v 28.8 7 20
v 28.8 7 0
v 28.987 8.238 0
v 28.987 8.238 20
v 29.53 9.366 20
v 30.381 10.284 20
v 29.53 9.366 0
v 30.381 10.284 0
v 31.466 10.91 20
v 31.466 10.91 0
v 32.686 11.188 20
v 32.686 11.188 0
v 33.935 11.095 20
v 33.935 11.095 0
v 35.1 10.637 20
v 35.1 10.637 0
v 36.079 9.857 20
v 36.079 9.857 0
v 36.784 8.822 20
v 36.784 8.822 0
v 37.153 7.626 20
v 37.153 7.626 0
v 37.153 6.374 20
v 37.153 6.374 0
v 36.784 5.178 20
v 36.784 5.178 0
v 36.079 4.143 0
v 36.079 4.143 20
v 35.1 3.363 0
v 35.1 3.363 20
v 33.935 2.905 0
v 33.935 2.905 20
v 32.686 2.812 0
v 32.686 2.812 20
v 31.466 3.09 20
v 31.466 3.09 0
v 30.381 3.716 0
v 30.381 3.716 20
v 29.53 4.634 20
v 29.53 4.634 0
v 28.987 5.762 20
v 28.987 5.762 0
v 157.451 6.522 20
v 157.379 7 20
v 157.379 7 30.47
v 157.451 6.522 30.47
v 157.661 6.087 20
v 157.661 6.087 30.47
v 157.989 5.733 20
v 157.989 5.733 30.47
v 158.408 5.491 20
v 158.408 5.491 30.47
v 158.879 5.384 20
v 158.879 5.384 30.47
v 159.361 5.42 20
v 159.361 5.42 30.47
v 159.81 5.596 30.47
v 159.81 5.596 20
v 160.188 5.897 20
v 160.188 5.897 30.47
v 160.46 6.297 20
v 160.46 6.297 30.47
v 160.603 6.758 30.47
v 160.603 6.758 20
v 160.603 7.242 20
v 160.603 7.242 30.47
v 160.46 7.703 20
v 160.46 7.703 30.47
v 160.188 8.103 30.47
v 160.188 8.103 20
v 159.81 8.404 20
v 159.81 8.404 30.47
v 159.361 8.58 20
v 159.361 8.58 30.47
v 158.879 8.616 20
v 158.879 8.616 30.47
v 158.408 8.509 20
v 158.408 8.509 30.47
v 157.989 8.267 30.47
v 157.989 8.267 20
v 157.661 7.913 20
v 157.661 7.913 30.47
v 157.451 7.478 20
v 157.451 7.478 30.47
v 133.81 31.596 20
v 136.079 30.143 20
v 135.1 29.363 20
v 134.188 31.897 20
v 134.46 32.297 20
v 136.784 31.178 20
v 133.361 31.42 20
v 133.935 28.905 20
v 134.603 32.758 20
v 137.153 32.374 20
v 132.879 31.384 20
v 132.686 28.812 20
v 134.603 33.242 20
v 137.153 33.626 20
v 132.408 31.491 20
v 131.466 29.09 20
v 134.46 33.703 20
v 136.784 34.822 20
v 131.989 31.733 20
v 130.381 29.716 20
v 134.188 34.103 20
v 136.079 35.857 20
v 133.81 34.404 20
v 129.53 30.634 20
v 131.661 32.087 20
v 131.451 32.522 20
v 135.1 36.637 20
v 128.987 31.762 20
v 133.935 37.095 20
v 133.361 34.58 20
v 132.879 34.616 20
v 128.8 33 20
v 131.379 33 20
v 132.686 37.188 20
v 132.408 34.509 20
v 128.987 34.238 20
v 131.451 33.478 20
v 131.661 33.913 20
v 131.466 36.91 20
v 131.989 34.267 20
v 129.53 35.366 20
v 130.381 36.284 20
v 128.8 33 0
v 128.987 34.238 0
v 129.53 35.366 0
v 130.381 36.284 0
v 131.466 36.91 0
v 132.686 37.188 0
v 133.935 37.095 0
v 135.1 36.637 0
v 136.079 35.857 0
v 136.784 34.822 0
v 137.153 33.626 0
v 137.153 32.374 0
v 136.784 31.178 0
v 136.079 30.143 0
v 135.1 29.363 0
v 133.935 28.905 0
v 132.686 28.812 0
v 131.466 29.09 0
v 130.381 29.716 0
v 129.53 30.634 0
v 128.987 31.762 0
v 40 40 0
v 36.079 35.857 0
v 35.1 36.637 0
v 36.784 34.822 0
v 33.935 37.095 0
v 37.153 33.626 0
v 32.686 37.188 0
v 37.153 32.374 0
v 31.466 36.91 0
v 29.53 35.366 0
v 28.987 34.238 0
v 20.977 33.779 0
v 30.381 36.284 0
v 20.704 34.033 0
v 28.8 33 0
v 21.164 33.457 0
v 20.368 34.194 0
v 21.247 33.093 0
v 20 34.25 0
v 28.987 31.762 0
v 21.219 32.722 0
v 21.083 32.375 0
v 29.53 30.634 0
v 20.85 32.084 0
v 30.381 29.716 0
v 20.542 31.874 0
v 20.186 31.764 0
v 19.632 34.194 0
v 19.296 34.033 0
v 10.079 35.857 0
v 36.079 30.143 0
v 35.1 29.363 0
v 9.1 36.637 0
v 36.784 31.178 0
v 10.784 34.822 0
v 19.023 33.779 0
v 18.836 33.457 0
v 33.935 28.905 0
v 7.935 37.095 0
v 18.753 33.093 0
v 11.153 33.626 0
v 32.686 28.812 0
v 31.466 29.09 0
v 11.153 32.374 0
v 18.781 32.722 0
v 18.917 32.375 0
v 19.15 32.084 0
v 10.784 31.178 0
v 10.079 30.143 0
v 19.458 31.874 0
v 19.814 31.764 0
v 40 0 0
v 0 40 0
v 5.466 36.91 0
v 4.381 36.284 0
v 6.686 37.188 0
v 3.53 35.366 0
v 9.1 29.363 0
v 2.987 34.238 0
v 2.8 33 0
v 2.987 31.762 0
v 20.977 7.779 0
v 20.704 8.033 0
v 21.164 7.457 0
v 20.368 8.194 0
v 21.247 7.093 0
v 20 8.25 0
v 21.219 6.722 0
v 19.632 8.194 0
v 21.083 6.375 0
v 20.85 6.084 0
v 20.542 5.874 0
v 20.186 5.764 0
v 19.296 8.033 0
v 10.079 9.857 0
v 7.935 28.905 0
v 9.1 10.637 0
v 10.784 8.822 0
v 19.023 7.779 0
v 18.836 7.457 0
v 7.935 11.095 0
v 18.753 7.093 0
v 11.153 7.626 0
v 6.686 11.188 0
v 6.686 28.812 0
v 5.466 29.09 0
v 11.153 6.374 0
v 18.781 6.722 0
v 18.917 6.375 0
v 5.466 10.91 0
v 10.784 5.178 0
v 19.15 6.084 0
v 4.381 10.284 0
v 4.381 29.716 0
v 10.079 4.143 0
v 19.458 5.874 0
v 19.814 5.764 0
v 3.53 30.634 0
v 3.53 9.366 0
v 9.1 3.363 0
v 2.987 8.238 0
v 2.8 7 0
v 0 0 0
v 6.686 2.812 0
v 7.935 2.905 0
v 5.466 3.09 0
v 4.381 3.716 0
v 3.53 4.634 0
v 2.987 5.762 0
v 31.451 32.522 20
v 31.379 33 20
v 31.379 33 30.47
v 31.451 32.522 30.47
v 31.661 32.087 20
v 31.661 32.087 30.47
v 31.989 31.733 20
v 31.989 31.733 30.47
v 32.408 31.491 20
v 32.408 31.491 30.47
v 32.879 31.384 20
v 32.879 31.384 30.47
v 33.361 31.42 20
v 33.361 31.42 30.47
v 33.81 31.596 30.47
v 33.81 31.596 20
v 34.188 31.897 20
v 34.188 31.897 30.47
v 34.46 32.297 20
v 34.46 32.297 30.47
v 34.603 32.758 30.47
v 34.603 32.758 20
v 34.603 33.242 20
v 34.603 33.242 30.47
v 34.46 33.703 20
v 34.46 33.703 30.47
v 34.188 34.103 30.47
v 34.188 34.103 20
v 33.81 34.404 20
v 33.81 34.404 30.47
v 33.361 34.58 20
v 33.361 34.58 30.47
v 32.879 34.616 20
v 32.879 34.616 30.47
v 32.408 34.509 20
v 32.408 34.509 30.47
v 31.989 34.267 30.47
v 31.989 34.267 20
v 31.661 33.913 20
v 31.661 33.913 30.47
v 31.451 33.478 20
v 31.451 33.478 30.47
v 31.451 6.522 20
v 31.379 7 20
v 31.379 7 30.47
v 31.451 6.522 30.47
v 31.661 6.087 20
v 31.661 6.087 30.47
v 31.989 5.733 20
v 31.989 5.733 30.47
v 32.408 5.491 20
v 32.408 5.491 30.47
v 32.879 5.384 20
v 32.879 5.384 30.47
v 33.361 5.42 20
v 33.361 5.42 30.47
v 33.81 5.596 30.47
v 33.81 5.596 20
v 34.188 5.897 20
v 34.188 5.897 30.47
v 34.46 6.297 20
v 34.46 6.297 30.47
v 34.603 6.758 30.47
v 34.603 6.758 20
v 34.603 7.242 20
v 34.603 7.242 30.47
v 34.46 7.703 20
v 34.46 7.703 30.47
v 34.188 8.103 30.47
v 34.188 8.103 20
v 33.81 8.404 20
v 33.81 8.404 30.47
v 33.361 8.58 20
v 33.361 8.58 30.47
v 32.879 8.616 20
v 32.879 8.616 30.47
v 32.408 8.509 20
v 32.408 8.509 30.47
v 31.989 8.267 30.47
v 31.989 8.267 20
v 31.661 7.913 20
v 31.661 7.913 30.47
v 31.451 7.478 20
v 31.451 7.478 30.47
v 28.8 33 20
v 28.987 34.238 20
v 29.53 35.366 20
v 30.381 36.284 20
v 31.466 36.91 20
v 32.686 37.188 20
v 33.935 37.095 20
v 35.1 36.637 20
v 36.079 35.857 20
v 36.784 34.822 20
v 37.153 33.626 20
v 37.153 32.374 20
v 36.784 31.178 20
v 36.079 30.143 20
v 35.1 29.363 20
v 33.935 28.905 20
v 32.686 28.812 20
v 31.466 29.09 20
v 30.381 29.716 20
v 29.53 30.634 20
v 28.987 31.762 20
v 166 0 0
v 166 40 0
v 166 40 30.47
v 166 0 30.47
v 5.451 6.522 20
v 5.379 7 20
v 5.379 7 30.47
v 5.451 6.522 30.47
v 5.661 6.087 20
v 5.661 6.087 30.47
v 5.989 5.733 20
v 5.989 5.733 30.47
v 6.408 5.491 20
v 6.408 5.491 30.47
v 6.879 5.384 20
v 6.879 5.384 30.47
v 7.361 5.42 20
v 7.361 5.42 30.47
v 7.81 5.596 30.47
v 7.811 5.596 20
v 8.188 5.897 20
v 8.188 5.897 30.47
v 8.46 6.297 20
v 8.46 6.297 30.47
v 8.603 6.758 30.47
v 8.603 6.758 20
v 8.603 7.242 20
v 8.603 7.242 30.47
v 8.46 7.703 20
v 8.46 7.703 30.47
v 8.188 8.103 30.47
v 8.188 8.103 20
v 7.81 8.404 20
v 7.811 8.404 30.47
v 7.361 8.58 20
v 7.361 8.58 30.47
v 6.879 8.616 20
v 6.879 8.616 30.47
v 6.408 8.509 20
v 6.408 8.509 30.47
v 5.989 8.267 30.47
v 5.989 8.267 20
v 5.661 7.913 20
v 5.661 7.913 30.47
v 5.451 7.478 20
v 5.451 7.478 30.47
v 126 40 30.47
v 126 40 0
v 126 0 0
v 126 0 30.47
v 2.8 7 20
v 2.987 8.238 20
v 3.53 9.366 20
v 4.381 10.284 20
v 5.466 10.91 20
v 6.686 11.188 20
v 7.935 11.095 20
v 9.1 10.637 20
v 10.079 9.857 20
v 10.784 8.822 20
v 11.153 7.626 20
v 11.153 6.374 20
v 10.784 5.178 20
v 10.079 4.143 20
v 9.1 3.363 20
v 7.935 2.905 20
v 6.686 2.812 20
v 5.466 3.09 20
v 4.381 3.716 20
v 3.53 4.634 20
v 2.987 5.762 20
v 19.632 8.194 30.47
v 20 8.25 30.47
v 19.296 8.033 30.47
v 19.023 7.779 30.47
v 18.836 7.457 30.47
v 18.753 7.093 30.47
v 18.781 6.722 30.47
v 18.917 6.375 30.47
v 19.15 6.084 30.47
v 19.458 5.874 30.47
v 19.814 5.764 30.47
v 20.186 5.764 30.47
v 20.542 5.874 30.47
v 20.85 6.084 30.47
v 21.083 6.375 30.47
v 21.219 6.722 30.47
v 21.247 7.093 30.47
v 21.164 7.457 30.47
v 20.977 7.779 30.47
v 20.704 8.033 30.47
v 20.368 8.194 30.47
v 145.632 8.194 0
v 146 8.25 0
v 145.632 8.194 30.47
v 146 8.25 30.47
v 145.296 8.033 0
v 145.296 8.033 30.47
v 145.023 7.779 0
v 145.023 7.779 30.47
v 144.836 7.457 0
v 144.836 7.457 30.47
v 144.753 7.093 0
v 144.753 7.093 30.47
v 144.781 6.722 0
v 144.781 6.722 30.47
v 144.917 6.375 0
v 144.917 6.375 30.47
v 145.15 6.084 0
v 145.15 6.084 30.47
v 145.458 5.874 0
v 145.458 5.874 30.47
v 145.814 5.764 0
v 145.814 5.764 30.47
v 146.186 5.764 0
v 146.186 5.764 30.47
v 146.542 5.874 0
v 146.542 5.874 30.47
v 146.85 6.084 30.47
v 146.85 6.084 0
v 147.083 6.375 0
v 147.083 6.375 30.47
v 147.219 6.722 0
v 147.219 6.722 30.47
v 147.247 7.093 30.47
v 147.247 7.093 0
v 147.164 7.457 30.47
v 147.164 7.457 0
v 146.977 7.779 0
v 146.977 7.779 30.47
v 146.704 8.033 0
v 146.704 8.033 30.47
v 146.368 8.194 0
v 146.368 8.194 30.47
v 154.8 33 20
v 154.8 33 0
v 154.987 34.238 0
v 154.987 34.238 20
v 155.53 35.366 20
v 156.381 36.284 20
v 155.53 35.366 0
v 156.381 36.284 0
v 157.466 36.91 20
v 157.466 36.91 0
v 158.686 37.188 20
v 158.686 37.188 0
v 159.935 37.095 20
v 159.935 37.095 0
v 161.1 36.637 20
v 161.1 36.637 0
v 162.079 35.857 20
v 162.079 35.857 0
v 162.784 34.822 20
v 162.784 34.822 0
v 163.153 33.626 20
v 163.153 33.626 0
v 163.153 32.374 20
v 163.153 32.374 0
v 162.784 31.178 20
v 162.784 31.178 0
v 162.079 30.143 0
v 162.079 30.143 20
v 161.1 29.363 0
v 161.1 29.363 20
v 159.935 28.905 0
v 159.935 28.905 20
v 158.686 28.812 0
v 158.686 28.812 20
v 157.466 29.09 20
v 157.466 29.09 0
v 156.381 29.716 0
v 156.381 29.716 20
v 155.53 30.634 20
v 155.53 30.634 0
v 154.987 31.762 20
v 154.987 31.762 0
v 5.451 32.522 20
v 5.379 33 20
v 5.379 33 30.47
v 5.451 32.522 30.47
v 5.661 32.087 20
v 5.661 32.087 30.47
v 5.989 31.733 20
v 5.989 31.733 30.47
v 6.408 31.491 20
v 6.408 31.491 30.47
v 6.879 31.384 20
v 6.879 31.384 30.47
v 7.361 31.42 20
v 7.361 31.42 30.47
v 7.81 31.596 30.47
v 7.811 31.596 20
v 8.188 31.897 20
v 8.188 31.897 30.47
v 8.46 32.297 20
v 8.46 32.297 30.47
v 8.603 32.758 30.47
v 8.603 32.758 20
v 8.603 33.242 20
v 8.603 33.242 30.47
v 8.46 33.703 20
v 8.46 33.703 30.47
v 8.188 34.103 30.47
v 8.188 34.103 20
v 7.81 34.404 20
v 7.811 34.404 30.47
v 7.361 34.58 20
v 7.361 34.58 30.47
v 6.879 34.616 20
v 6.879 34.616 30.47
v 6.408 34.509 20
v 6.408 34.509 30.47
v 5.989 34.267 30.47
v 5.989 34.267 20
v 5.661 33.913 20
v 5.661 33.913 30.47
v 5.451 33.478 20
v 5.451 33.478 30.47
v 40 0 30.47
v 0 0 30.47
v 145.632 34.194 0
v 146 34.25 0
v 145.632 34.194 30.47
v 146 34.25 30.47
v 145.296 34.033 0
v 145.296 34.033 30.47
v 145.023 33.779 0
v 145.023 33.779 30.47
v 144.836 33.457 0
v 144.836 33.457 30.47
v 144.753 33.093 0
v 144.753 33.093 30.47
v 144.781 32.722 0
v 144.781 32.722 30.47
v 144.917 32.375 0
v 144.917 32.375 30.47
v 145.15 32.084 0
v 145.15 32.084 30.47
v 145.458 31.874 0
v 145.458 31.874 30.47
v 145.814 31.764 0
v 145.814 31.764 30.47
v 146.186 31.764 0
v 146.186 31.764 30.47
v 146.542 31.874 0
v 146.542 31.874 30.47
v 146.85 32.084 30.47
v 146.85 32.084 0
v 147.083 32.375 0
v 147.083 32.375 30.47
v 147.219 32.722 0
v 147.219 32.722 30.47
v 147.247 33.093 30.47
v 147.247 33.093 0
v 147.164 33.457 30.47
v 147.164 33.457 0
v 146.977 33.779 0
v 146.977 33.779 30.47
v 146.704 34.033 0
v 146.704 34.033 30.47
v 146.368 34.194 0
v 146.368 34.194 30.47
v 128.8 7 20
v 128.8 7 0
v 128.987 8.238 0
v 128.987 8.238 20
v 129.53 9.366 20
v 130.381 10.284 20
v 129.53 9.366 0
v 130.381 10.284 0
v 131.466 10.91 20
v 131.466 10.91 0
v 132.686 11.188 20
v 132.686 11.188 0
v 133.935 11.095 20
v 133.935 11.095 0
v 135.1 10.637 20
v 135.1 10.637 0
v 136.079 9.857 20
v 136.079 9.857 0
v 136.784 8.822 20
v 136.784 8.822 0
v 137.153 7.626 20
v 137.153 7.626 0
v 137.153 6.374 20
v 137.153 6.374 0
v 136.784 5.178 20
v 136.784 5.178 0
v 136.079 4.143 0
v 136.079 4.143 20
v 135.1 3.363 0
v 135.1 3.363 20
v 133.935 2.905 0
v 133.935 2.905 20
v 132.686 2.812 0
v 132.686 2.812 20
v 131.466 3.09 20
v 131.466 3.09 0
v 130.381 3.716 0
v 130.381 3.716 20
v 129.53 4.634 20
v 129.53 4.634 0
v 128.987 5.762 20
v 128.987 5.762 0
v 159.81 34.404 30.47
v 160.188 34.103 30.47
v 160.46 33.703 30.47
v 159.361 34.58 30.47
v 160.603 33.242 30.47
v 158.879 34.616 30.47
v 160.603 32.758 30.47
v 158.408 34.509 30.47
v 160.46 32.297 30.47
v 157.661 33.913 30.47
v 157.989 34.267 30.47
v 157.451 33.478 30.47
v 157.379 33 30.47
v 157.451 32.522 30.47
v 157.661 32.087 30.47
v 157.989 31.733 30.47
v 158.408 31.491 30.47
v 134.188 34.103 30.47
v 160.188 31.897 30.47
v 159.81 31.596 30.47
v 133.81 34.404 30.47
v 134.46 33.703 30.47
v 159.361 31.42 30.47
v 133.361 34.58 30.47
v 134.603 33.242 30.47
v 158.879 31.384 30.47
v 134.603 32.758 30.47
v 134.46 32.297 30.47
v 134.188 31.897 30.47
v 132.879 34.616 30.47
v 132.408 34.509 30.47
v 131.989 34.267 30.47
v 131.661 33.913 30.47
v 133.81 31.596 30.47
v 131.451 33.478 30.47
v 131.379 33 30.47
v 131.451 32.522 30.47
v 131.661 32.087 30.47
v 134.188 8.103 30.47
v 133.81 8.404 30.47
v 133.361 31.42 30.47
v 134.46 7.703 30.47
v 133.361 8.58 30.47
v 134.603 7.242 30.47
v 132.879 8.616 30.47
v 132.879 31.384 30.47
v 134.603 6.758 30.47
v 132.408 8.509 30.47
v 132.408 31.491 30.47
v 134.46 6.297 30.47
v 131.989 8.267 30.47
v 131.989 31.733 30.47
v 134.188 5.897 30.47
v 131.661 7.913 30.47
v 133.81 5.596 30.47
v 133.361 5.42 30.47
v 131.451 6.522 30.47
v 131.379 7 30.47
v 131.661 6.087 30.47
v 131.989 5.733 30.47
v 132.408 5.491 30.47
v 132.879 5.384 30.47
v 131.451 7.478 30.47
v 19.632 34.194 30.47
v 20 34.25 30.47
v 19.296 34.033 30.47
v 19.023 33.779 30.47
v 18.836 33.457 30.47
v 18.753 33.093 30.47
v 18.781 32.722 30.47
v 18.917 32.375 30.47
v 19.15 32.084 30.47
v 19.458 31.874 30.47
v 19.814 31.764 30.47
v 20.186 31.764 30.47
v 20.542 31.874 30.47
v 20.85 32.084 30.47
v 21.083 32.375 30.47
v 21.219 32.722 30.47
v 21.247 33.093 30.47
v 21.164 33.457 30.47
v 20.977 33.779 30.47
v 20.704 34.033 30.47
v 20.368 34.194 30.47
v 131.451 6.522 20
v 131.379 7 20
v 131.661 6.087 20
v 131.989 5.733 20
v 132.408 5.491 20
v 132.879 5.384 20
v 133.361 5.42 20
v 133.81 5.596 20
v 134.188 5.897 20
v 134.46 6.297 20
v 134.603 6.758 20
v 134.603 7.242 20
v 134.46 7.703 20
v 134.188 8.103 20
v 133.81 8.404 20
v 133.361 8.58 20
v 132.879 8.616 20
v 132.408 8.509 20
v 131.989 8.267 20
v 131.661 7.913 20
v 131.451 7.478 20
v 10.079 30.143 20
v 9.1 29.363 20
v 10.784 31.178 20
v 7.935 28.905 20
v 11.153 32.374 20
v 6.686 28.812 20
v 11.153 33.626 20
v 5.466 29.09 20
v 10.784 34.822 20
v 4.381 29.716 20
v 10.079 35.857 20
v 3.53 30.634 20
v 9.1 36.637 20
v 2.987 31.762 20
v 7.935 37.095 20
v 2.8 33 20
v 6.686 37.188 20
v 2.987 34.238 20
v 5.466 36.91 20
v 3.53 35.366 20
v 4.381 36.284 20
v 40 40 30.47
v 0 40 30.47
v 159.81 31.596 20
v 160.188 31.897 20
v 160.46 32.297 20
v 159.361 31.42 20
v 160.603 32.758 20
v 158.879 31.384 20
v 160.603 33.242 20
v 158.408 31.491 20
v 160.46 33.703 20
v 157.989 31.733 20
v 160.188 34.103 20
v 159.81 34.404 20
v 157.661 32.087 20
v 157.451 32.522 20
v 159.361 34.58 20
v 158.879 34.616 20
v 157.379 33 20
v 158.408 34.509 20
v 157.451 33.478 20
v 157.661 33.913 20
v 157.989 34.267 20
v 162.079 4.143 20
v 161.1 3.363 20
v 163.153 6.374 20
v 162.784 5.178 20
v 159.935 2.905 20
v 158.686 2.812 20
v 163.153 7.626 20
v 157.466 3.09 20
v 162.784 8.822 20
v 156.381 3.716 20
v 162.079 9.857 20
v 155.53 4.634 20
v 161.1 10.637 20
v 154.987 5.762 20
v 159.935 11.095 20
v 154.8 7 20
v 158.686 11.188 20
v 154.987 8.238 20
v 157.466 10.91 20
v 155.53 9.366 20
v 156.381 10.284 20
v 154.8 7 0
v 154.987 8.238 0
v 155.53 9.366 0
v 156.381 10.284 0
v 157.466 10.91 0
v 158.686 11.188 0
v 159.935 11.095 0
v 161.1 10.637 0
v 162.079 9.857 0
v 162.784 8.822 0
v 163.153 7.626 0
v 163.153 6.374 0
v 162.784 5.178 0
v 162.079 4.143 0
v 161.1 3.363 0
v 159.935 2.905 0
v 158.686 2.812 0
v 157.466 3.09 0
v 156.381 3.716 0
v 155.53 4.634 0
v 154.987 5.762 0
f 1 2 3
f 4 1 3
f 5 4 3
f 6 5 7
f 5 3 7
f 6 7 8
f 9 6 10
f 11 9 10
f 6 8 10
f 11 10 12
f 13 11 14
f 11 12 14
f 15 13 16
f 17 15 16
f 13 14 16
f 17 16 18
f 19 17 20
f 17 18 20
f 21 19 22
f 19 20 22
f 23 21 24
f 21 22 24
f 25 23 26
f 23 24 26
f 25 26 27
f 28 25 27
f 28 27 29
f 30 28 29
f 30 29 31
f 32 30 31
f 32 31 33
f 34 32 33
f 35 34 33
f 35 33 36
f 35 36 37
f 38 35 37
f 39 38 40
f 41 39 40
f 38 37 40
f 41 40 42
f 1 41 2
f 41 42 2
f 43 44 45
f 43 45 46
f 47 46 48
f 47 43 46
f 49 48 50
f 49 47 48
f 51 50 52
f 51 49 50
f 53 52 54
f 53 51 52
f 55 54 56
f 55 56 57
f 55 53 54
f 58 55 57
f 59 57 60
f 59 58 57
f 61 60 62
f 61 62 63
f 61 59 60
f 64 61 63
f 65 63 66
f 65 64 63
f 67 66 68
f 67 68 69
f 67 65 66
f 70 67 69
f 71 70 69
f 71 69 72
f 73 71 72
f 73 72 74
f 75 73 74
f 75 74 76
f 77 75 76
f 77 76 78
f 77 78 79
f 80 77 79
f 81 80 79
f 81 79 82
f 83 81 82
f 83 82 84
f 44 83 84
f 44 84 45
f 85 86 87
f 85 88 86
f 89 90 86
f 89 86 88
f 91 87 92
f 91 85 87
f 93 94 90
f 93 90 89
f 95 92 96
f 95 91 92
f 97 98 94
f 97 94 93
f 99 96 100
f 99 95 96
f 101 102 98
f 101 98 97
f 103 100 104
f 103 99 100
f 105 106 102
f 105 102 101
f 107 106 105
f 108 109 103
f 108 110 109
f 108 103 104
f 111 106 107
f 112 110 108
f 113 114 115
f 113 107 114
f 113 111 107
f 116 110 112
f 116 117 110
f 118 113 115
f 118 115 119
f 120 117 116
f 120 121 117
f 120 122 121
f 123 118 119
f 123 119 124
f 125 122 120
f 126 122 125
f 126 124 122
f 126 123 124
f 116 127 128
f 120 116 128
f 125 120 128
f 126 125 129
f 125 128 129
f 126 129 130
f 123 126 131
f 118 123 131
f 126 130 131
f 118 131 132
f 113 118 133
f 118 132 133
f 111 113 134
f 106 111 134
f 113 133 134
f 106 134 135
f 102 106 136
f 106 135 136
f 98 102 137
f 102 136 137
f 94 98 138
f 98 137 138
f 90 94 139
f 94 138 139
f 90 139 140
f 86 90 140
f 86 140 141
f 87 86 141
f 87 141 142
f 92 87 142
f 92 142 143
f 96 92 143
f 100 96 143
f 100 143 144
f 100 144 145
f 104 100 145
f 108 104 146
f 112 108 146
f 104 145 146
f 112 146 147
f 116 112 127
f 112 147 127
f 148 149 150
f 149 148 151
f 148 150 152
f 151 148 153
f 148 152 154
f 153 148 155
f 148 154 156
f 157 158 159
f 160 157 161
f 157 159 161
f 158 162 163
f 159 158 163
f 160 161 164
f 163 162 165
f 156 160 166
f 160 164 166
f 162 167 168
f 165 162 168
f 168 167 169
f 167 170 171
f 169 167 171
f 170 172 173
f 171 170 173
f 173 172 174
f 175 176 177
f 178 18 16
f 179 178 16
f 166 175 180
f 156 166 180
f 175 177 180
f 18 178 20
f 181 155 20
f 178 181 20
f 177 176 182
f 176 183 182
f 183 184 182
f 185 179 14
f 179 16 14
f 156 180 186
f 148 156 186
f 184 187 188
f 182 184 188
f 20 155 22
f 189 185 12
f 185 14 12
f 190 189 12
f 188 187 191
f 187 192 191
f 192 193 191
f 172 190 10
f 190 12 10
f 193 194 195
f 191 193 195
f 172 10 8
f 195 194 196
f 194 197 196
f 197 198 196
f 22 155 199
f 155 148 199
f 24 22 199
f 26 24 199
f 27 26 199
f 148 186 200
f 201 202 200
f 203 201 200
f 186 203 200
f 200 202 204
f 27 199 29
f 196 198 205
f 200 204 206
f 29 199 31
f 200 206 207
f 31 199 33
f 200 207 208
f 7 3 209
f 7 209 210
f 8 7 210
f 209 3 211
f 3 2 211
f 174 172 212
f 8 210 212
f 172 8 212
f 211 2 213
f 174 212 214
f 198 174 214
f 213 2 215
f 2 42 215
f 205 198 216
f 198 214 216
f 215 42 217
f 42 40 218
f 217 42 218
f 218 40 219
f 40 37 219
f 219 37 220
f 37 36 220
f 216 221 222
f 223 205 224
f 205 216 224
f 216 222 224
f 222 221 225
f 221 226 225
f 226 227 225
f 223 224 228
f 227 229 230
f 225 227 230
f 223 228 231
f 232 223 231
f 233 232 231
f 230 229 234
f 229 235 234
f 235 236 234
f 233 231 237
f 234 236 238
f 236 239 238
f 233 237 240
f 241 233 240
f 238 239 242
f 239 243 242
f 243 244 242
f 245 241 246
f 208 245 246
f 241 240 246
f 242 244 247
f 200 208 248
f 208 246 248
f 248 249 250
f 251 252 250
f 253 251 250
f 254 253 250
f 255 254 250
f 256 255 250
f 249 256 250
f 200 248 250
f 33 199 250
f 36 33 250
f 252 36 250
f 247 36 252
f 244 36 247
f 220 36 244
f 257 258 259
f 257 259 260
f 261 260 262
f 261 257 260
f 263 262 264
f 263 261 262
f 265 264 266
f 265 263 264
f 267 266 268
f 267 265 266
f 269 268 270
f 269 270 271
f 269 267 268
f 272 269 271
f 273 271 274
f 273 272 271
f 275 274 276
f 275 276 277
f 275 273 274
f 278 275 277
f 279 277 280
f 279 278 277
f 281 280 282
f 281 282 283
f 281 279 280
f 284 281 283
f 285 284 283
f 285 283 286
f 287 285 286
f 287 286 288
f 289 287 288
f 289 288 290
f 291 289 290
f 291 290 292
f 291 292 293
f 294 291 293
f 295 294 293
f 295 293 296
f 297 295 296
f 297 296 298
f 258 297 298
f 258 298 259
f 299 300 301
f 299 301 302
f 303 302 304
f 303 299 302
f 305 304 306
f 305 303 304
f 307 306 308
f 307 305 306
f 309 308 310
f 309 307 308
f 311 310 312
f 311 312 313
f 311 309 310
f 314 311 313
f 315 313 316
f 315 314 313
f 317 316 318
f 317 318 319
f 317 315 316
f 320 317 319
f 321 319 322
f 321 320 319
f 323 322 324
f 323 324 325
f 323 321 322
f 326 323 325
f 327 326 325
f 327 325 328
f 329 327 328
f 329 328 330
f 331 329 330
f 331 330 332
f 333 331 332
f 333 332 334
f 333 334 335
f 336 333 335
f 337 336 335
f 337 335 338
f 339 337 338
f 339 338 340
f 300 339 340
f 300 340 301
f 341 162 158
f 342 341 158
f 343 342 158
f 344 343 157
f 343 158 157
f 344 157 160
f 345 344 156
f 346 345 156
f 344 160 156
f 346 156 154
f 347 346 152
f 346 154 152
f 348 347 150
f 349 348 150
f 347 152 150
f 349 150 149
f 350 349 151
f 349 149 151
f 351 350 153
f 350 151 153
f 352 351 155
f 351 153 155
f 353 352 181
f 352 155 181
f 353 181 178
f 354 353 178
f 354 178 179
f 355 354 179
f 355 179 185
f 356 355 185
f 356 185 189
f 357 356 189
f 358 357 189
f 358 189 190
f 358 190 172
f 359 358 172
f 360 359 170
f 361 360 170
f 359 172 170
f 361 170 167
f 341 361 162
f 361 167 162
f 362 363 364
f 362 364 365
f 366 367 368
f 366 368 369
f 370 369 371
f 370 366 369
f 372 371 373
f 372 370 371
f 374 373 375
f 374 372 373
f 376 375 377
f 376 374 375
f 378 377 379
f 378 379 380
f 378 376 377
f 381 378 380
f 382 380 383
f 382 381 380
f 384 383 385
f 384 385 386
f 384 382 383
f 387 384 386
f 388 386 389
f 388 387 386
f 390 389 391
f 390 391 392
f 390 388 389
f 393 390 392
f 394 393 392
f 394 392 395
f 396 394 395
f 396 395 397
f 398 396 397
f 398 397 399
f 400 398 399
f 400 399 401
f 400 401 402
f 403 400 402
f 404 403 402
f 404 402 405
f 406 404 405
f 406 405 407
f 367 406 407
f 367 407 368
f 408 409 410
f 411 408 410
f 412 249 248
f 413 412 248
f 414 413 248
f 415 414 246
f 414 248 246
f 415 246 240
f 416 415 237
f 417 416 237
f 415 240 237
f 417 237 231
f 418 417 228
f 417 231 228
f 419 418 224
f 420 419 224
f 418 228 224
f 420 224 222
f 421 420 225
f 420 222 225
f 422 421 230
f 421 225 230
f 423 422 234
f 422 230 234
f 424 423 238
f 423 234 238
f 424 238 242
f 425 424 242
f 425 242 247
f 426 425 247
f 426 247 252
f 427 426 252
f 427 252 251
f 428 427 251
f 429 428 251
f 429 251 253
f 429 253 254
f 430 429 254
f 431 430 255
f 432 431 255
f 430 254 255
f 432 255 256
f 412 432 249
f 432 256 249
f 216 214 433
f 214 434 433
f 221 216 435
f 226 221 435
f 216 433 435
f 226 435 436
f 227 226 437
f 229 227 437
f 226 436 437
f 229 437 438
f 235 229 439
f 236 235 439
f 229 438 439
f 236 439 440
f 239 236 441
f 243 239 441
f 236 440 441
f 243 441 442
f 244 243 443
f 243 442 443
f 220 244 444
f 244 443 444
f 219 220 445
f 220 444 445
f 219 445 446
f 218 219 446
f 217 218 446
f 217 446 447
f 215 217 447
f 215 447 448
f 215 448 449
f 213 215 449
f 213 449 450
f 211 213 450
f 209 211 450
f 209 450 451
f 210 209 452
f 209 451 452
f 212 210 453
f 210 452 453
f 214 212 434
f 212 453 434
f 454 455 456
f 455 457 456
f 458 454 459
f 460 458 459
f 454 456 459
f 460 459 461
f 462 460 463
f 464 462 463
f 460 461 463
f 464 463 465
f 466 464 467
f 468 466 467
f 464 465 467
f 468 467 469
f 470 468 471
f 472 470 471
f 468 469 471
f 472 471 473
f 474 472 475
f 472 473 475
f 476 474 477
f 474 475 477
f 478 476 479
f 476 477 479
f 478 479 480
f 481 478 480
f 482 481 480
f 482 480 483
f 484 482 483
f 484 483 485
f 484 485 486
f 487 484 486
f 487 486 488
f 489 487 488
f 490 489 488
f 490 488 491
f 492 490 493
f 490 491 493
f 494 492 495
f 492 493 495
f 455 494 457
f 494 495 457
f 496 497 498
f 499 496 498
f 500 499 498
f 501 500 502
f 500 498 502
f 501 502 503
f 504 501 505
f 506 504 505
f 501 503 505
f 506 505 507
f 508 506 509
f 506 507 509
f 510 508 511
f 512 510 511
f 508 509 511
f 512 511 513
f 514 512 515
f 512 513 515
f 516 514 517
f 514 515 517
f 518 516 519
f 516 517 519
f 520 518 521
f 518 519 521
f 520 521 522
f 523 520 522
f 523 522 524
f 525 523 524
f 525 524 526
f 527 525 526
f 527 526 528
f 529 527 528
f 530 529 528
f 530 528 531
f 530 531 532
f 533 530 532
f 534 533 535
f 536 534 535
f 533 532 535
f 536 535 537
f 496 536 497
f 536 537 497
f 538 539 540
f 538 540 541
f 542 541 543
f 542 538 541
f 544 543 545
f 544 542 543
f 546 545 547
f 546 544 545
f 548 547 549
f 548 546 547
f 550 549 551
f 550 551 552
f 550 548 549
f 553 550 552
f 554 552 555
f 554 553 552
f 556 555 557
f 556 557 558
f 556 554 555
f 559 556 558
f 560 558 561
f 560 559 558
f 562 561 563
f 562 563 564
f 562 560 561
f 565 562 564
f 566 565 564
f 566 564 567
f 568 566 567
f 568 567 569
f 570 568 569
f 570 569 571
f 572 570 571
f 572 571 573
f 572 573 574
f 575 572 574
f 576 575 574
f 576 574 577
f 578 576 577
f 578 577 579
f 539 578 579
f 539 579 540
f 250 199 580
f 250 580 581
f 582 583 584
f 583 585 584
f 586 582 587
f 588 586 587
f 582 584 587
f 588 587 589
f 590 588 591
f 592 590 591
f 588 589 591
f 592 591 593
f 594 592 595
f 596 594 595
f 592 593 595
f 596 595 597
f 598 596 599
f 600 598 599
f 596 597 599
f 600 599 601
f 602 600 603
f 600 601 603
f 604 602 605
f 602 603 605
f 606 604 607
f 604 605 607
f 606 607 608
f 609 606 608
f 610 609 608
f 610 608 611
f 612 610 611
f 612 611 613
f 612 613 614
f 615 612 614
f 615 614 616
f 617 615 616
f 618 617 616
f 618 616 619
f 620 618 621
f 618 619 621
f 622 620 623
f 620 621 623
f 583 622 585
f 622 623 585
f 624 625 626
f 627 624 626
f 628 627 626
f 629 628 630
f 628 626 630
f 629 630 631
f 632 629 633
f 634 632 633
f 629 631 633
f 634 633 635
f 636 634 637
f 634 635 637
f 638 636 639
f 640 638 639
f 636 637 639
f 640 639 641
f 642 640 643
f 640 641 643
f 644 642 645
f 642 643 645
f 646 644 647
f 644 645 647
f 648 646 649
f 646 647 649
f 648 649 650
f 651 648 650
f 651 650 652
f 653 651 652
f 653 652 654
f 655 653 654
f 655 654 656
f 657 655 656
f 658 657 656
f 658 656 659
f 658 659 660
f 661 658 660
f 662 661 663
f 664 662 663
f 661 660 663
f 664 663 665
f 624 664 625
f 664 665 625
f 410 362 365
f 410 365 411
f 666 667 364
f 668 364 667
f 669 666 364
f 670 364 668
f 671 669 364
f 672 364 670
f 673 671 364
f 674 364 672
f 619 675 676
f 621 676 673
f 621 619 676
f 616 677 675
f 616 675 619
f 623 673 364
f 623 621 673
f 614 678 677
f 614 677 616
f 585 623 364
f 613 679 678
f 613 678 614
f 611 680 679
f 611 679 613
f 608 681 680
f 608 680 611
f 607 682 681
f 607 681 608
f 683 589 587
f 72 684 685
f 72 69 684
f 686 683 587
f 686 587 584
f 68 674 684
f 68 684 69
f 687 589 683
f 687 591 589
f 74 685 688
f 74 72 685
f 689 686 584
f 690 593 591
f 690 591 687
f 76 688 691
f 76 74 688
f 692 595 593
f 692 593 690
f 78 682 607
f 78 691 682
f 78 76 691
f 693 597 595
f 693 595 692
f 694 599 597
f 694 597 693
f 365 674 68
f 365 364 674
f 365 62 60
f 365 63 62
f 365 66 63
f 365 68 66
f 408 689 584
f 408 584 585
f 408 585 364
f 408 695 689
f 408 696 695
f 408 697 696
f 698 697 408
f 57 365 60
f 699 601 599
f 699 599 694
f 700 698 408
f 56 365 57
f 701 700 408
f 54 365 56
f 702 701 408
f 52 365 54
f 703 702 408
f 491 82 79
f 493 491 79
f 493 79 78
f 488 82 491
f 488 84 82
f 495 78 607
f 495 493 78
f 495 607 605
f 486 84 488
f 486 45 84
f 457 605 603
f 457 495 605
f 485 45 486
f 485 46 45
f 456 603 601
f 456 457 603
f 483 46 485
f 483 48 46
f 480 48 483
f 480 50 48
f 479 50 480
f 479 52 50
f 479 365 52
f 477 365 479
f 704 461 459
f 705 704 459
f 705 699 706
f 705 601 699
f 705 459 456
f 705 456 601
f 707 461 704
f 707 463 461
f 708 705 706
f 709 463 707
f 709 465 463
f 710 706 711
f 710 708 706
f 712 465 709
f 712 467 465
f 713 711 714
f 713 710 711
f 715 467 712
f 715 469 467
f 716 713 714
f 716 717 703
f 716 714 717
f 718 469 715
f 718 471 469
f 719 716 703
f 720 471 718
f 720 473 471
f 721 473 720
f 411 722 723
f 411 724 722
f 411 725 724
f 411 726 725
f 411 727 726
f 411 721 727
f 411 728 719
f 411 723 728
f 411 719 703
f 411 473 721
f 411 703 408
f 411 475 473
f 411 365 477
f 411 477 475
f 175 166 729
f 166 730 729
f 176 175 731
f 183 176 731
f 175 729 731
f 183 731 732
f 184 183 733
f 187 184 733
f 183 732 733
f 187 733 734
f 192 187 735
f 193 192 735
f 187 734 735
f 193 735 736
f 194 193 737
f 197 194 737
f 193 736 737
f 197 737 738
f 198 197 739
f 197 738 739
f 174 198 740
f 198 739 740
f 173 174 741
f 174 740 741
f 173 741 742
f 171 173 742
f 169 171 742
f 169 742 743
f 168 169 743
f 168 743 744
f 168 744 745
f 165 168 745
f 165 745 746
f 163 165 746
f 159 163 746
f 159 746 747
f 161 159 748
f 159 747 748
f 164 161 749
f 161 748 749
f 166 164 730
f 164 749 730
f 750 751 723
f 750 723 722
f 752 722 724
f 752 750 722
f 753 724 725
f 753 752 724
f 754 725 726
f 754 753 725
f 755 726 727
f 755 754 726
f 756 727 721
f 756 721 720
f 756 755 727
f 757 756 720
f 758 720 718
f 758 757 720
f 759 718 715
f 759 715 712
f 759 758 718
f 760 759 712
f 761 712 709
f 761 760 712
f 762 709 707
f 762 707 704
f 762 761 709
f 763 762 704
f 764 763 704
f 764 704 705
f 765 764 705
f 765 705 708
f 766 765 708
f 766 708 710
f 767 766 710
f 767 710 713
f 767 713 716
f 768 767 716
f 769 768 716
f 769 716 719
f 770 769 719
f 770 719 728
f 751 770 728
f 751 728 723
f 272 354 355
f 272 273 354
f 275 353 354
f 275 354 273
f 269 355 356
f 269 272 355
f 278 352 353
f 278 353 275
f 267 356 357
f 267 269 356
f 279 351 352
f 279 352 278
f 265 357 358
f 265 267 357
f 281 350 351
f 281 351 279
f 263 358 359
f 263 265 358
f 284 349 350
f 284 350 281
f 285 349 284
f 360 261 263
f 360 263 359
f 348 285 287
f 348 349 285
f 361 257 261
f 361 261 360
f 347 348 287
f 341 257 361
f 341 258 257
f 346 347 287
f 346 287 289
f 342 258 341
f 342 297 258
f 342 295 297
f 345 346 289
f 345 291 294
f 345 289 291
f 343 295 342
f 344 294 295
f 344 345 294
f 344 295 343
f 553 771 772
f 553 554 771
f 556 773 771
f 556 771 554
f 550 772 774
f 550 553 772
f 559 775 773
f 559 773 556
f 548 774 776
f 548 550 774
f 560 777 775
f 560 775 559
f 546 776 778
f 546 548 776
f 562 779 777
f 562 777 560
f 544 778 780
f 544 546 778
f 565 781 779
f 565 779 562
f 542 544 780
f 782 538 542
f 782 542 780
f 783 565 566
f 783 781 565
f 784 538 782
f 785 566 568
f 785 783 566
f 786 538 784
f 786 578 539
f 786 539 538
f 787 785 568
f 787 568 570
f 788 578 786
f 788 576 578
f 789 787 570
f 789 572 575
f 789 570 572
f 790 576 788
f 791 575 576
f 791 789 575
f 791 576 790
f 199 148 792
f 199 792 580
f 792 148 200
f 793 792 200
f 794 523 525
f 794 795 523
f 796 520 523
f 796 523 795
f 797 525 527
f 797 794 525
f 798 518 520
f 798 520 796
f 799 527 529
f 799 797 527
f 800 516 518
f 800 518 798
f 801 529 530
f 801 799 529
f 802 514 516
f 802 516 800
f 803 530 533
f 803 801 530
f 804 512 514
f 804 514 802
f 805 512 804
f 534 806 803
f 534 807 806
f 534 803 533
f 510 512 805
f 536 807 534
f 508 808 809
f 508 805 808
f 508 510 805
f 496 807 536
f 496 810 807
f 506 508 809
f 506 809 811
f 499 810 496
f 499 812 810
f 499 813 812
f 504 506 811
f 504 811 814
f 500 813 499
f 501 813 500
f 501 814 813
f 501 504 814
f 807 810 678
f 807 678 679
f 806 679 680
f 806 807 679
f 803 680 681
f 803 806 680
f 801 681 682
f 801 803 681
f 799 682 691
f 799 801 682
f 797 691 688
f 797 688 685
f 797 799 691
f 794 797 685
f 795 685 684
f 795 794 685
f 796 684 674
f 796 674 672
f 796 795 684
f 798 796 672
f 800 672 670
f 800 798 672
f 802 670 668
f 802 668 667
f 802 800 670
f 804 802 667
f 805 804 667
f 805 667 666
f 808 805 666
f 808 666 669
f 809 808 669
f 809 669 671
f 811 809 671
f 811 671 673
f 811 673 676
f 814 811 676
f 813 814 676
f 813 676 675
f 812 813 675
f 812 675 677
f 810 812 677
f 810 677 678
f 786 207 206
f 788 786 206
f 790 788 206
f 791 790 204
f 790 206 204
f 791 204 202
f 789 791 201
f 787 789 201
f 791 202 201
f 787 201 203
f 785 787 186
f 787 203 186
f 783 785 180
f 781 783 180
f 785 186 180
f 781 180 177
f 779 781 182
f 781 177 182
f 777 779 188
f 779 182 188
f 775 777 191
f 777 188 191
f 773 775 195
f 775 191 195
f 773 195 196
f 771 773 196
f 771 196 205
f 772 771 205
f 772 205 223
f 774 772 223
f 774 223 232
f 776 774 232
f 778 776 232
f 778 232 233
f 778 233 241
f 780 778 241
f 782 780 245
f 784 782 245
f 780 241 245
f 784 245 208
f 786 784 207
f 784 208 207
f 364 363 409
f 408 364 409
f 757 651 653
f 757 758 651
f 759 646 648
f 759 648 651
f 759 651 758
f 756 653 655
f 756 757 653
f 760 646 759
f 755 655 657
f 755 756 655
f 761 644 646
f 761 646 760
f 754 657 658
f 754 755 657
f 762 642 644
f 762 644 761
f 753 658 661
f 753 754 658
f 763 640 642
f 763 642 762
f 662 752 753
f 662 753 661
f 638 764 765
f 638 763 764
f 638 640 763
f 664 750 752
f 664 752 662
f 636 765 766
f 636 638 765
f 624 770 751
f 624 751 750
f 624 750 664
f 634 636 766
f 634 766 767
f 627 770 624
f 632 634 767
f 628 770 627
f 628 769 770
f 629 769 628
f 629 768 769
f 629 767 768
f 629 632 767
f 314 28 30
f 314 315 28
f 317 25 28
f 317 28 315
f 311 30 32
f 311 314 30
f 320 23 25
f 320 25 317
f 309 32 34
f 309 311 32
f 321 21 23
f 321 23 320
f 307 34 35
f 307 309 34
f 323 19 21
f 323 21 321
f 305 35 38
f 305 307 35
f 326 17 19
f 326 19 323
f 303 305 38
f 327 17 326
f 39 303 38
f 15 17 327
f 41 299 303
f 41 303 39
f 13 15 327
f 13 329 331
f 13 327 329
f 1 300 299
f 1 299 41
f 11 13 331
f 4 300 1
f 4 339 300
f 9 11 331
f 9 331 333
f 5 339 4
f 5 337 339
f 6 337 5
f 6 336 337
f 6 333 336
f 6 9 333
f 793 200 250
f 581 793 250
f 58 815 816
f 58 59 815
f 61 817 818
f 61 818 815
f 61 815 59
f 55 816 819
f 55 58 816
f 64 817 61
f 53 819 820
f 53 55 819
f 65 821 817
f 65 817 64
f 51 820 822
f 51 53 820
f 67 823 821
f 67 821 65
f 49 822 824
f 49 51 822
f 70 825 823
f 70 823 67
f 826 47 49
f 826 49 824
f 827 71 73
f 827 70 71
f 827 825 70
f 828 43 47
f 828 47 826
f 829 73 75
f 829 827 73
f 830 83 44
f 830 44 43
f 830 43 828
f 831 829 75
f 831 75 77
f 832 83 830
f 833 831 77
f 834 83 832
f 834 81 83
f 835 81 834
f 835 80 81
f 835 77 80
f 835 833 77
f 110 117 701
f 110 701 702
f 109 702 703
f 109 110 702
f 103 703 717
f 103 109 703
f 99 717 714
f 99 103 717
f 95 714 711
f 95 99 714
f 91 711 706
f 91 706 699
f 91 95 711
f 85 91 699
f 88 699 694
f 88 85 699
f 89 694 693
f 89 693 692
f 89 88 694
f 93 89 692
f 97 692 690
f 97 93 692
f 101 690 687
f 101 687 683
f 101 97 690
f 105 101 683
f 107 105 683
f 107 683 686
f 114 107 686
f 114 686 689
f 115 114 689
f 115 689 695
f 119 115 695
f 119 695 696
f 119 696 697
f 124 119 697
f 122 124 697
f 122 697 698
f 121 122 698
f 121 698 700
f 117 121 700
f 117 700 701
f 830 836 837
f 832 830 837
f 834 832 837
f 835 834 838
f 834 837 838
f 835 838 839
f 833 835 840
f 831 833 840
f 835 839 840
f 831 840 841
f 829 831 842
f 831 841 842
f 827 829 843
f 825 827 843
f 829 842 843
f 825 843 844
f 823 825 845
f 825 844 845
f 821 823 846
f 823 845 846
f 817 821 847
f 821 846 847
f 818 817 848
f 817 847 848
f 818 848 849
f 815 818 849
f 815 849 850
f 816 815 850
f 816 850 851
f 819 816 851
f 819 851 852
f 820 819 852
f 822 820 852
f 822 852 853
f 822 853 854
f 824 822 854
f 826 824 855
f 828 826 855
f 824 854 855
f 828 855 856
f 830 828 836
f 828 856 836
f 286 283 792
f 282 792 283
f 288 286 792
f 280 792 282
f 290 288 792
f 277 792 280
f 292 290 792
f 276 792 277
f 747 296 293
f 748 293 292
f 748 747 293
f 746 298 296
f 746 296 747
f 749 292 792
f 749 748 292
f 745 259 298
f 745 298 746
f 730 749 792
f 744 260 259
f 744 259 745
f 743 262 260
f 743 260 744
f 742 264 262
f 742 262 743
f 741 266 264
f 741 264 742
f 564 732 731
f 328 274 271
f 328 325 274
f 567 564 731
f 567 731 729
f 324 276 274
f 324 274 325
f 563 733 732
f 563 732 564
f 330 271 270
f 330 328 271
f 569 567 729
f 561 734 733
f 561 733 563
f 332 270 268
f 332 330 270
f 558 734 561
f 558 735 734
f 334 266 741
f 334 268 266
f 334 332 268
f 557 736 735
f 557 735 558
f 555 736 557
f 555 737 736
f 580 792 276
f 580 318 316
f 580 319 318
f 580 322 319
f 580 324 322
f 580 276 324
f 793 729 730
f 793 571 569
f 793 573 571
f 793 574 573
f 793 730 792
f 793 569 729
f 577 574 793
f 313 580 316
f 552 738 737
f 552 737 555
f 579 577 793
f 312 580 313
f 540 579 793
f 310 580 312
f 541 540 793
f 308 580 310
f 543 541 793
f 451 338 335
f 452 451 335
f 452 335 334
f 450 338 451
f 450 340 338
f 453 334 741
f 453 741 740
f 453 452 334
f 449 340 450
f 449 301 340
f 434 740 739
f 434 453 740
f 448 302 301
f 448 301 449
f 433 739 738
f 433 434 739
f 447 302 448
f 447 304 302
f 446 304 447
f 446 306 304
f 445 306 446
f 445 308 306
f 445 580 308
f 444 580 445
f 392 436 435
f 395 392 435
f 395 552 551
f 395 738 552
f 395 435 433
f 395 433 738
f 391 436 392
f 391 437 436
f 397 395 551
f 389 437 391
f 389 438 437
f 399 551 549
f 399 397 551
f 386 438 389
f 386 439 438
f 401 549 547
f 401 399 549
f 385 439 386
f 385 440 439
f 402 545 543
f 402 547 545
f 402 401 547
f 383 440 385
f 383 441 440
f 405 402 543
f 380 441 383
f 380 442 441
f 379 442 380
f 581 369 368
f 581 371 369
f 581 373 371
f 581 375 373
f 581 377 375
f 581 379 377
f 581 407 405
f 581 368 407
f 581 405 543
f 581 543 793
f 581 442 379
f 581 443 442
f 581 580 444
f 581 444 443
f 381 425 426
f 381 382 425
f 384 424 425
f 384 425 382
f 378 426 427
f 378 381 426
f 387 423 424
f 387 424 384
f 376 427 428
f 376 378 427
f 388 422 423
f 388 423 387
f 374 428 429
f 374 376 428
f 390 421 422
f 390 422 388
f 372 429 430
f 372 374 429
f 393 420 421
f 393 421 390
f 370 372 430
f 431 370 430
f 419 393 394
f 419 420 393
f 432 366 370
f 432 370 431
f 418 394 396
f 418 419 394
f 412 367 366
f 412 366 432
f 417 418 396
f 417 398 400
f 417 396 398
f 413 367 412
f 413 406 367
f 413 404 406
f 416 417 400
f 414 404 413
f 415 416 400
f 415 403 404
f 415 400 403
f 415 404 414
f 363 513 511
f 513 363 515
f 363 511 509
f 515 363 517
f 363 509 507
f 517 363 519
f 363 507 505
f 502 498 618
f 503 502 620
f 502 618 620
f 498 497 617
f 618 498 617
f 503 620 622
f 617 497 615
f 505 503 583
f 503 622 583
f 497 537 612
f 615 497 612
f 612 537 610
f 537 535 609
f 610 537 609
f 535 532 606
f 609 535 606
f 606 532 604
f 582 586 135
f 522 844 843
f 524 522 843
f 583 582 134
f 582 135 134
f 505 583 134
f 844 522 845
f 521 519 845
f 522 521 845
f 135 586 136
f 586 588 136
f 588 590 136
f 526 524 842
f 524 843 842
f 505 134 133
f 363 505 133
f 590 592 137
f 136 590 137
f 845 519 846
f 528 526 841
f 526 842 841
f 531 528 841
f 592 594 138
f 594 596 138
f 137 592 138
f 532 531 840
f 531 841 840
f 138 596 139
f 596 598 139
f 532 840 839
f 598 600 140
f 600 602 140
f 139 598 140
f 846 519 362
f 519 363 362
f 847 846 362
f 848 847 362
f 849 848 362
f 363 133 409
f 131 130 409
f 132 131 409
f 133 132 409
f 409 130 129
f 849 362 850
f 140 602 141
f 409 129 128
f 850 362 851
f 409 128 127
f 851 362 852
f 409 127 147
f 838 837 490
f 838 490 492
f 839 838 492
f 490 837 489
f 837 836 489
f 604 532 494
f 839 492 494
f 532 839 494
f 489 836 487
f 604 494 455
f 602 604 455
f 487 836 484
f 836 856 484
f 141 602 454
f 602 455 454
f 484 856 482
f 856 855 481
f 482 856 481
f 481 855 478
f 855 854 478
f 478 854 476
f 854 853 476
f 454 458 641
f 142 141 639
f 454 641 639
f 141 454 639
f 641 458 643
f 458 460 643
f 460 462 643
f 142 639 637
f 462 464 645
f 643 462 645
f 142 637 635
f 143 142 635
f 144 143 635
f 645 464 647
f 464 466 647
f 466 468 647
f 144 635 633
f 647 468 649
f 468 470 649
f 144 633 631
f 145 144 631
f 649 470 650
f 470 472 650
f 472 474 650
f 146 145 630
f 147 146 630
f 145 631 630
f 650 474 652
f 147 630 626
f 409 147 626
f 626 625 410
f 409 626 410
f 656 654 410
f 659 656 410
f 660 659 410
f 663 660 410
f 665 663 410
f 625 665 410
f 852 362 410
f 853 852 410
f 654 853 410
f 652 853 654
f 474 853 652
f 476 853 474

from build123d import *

# Parameters (mm, degrees)
SKETCH1_W                      = 40
SKETCH1_H                      = 40
SKETCH1_R                      = 1.621
BOSS_EXTRUDE1_DEPTH            = 30.47
BOSS_EXTRUDE1_2_DEPTH          = 30.47
SKETCH4_R                      = 4.2
CUT_EXTRUDE1_DEPTH             = 20
SKETCH7_W                      = 1.25
SKETCH7_H                      = 30.47
M3X0_5_TAPPED_HOLE1_AT_2_COUNT = 2
M3X0_5_TAPPED_HOLE1_AT_2_PITCH = 26
M3X0_5_TAPPED_HOLE1_AT_3_COUNT = 2
M3X0_5_TAPPED_HOLE1_AT_3_PITCH = 128.654576289
M3X0_5_TAPPED_HOLE1_AT_4_COUNT = 2
M3X0_5_TAPPED_HOLE1_AT_4_PITCH = 126


with BuildPart() as part:
    # Sketch1 → Boss-Extrude1 (new body)
    with BuildSketch(Plane(origin=(0, 0, 0), x_dir=(-1, 0, 0), z_dir=(0, 0, 1))):
        with Locations((-20, -20)):
            Rectangle(SKETCH1_W, SKETCH1_H)
        with Locations((-33, -7)):
            Circle(SKETCH1_R, mode=Mode.SUBTRACT)
        with Locations((-7, -7)):
            Circle(SKETCH1_R, mode=Mode.SUBTRACT)
        with Locations((-7, -33)):
            Circle(SKETCH1_R, mode=Mode.SUBTRACT)
        with Locations((-33, -33)):
            Circle(SKETCH1_R, mode=Mode.SUBTRACT)
    extrude(amount=BOSS_EXTRUDE1_DEPTH)


with BuildPart() as body_2:
    # Sketch1 → Boss-Extrude1 2 (new body)
    with BuildSketch(Plane(origin=(0, 0, 0), x_dir=(-1, 0, 0), z_dir=(0, 0, 1))):
        with Locations((-146, -20)):
            Rectangle(SKETCH1_W, SKETCH1_H)
        with Locations((-159, -7)):
            Circle(SKETCH1_R, mode=Mode.SUBTRACT)
        with Locations((-133, -7)):
            Circle(SKETCH1_R, mode=Mode.SUBTRACT)
        with Locations((-133, -33)):
            Circle(SKETCH1_R, mode=Mode.SUBTRACT)
        with Locations((-159, -33)):
            Circle(SKETCH1_R, mode=Mode.SUBTRACT)
    extrude(amount=BOSS_EXTRUDE1_2_DEPTH)


with BuildPart() as cut_extrude1_tool:
    # Sketch4 → Cut-Extrude1 (new body)
    with BuildSketch(Plane(origin=(0, 0, 0), x_dir=(-1, 0, 0), z_dir=(0, 0, -1))):
        with Locations((-7, 7)):
            Circle(SKETCH4_R)
        with Locations((-33, 7)):
            Circle(SKETCH4_R)
        with Locations((-7, 33)):
            Circle(SKETCH4_R)
        with Locations((-33, 33)):
            Circle(SKETCH4_R)
        with Locations((-133, 7)):
            Circle(SKETCH4_R)
        with Locations((-133, 33)):
            Circle(SKETCH4_R)
        with Locations((-159, 33)):
            Circle(SKETCH4_R)
        with Locations((-159, 7)):
            Circle(SKETCH4_R)
    extrude(amount=-CUT_EXTRUDE1_DEPTH)


with BuildPart() as part_1:
    add(part.part)

    # Cut-Extrude1: cut by cut_extrude1_tool
    add(cut_extrude1_tool.part, mode=Mode.SUBTRACT)

    # Sketch7 → M3x0.5 Tapped Hole1 (revolve, cut)
    with BuildSketch(Plane(origin=(20, 7, 0), x_dir=(0, 1, 0), z_dir=(1, 0, 0))):
        with Locations((0.625, 15.235)):
            Rectangle(SKETCH7_W, SKETCH7_H)
    m3x0_5_tapped_hole1 = revolve(axis=Axis((20, 7, -6.35), (0, 0, 1)), mode=Mode.SUBTRACT)

    # M3x0.5 Tapped Hole1 at 2: M3x0.5 Tapped Hole1 ×2
    with Locations(*[(0, i * M3X0_5_TAPPED_HOLE1_AT_2_PITCH, 0) for i in range(1, M3X0_5_TAPPED_HOLE1_AT_2_COUNT)]):
        add(m3x0_5_tapped_hole1, mode=Mode.SUBTRACT)


with BuildPart() as body_2_1:
    add(body_2.part)

    # Cut-Extrude1: cut by cut_extrude1_tool
    add(cut_extrude1_tool.part, mode=Mode.SUBTRACT)

    # M3x0.5 Tapped Hole1 at 3: M3x0.5 Tapped Hole1 ×2
    with Locations(*[Vector(0.9793666392196709, 0.20209152872786895, 0) * (i * M3X0_5_TAPPED_HOLE1_AT_3_PITCH) for i in range(1, M3X0_5_TAPPED_HOLE1_AT_3_COUNT)]):
        add(m3x0_5_tapped_hole1, mode=Mode.SUBTRACT)

    # M3x0.5 Tapped Hole1 at 4: M3x0.5 Tapped Hole1 ×2
    with Locations(*[(i * M3X0_5_TAPPED_HOLE1_AT_4_PITCH, 0, 0) for i in range(1, M3X0_5_TAPPED_HOLE1_AT_4_COUNT)]):
        add(m3x0_5_tapped_hole1, mode=Mode.SUBTRACT)


solid = Compound([part_1.part, body_2_1.part])
